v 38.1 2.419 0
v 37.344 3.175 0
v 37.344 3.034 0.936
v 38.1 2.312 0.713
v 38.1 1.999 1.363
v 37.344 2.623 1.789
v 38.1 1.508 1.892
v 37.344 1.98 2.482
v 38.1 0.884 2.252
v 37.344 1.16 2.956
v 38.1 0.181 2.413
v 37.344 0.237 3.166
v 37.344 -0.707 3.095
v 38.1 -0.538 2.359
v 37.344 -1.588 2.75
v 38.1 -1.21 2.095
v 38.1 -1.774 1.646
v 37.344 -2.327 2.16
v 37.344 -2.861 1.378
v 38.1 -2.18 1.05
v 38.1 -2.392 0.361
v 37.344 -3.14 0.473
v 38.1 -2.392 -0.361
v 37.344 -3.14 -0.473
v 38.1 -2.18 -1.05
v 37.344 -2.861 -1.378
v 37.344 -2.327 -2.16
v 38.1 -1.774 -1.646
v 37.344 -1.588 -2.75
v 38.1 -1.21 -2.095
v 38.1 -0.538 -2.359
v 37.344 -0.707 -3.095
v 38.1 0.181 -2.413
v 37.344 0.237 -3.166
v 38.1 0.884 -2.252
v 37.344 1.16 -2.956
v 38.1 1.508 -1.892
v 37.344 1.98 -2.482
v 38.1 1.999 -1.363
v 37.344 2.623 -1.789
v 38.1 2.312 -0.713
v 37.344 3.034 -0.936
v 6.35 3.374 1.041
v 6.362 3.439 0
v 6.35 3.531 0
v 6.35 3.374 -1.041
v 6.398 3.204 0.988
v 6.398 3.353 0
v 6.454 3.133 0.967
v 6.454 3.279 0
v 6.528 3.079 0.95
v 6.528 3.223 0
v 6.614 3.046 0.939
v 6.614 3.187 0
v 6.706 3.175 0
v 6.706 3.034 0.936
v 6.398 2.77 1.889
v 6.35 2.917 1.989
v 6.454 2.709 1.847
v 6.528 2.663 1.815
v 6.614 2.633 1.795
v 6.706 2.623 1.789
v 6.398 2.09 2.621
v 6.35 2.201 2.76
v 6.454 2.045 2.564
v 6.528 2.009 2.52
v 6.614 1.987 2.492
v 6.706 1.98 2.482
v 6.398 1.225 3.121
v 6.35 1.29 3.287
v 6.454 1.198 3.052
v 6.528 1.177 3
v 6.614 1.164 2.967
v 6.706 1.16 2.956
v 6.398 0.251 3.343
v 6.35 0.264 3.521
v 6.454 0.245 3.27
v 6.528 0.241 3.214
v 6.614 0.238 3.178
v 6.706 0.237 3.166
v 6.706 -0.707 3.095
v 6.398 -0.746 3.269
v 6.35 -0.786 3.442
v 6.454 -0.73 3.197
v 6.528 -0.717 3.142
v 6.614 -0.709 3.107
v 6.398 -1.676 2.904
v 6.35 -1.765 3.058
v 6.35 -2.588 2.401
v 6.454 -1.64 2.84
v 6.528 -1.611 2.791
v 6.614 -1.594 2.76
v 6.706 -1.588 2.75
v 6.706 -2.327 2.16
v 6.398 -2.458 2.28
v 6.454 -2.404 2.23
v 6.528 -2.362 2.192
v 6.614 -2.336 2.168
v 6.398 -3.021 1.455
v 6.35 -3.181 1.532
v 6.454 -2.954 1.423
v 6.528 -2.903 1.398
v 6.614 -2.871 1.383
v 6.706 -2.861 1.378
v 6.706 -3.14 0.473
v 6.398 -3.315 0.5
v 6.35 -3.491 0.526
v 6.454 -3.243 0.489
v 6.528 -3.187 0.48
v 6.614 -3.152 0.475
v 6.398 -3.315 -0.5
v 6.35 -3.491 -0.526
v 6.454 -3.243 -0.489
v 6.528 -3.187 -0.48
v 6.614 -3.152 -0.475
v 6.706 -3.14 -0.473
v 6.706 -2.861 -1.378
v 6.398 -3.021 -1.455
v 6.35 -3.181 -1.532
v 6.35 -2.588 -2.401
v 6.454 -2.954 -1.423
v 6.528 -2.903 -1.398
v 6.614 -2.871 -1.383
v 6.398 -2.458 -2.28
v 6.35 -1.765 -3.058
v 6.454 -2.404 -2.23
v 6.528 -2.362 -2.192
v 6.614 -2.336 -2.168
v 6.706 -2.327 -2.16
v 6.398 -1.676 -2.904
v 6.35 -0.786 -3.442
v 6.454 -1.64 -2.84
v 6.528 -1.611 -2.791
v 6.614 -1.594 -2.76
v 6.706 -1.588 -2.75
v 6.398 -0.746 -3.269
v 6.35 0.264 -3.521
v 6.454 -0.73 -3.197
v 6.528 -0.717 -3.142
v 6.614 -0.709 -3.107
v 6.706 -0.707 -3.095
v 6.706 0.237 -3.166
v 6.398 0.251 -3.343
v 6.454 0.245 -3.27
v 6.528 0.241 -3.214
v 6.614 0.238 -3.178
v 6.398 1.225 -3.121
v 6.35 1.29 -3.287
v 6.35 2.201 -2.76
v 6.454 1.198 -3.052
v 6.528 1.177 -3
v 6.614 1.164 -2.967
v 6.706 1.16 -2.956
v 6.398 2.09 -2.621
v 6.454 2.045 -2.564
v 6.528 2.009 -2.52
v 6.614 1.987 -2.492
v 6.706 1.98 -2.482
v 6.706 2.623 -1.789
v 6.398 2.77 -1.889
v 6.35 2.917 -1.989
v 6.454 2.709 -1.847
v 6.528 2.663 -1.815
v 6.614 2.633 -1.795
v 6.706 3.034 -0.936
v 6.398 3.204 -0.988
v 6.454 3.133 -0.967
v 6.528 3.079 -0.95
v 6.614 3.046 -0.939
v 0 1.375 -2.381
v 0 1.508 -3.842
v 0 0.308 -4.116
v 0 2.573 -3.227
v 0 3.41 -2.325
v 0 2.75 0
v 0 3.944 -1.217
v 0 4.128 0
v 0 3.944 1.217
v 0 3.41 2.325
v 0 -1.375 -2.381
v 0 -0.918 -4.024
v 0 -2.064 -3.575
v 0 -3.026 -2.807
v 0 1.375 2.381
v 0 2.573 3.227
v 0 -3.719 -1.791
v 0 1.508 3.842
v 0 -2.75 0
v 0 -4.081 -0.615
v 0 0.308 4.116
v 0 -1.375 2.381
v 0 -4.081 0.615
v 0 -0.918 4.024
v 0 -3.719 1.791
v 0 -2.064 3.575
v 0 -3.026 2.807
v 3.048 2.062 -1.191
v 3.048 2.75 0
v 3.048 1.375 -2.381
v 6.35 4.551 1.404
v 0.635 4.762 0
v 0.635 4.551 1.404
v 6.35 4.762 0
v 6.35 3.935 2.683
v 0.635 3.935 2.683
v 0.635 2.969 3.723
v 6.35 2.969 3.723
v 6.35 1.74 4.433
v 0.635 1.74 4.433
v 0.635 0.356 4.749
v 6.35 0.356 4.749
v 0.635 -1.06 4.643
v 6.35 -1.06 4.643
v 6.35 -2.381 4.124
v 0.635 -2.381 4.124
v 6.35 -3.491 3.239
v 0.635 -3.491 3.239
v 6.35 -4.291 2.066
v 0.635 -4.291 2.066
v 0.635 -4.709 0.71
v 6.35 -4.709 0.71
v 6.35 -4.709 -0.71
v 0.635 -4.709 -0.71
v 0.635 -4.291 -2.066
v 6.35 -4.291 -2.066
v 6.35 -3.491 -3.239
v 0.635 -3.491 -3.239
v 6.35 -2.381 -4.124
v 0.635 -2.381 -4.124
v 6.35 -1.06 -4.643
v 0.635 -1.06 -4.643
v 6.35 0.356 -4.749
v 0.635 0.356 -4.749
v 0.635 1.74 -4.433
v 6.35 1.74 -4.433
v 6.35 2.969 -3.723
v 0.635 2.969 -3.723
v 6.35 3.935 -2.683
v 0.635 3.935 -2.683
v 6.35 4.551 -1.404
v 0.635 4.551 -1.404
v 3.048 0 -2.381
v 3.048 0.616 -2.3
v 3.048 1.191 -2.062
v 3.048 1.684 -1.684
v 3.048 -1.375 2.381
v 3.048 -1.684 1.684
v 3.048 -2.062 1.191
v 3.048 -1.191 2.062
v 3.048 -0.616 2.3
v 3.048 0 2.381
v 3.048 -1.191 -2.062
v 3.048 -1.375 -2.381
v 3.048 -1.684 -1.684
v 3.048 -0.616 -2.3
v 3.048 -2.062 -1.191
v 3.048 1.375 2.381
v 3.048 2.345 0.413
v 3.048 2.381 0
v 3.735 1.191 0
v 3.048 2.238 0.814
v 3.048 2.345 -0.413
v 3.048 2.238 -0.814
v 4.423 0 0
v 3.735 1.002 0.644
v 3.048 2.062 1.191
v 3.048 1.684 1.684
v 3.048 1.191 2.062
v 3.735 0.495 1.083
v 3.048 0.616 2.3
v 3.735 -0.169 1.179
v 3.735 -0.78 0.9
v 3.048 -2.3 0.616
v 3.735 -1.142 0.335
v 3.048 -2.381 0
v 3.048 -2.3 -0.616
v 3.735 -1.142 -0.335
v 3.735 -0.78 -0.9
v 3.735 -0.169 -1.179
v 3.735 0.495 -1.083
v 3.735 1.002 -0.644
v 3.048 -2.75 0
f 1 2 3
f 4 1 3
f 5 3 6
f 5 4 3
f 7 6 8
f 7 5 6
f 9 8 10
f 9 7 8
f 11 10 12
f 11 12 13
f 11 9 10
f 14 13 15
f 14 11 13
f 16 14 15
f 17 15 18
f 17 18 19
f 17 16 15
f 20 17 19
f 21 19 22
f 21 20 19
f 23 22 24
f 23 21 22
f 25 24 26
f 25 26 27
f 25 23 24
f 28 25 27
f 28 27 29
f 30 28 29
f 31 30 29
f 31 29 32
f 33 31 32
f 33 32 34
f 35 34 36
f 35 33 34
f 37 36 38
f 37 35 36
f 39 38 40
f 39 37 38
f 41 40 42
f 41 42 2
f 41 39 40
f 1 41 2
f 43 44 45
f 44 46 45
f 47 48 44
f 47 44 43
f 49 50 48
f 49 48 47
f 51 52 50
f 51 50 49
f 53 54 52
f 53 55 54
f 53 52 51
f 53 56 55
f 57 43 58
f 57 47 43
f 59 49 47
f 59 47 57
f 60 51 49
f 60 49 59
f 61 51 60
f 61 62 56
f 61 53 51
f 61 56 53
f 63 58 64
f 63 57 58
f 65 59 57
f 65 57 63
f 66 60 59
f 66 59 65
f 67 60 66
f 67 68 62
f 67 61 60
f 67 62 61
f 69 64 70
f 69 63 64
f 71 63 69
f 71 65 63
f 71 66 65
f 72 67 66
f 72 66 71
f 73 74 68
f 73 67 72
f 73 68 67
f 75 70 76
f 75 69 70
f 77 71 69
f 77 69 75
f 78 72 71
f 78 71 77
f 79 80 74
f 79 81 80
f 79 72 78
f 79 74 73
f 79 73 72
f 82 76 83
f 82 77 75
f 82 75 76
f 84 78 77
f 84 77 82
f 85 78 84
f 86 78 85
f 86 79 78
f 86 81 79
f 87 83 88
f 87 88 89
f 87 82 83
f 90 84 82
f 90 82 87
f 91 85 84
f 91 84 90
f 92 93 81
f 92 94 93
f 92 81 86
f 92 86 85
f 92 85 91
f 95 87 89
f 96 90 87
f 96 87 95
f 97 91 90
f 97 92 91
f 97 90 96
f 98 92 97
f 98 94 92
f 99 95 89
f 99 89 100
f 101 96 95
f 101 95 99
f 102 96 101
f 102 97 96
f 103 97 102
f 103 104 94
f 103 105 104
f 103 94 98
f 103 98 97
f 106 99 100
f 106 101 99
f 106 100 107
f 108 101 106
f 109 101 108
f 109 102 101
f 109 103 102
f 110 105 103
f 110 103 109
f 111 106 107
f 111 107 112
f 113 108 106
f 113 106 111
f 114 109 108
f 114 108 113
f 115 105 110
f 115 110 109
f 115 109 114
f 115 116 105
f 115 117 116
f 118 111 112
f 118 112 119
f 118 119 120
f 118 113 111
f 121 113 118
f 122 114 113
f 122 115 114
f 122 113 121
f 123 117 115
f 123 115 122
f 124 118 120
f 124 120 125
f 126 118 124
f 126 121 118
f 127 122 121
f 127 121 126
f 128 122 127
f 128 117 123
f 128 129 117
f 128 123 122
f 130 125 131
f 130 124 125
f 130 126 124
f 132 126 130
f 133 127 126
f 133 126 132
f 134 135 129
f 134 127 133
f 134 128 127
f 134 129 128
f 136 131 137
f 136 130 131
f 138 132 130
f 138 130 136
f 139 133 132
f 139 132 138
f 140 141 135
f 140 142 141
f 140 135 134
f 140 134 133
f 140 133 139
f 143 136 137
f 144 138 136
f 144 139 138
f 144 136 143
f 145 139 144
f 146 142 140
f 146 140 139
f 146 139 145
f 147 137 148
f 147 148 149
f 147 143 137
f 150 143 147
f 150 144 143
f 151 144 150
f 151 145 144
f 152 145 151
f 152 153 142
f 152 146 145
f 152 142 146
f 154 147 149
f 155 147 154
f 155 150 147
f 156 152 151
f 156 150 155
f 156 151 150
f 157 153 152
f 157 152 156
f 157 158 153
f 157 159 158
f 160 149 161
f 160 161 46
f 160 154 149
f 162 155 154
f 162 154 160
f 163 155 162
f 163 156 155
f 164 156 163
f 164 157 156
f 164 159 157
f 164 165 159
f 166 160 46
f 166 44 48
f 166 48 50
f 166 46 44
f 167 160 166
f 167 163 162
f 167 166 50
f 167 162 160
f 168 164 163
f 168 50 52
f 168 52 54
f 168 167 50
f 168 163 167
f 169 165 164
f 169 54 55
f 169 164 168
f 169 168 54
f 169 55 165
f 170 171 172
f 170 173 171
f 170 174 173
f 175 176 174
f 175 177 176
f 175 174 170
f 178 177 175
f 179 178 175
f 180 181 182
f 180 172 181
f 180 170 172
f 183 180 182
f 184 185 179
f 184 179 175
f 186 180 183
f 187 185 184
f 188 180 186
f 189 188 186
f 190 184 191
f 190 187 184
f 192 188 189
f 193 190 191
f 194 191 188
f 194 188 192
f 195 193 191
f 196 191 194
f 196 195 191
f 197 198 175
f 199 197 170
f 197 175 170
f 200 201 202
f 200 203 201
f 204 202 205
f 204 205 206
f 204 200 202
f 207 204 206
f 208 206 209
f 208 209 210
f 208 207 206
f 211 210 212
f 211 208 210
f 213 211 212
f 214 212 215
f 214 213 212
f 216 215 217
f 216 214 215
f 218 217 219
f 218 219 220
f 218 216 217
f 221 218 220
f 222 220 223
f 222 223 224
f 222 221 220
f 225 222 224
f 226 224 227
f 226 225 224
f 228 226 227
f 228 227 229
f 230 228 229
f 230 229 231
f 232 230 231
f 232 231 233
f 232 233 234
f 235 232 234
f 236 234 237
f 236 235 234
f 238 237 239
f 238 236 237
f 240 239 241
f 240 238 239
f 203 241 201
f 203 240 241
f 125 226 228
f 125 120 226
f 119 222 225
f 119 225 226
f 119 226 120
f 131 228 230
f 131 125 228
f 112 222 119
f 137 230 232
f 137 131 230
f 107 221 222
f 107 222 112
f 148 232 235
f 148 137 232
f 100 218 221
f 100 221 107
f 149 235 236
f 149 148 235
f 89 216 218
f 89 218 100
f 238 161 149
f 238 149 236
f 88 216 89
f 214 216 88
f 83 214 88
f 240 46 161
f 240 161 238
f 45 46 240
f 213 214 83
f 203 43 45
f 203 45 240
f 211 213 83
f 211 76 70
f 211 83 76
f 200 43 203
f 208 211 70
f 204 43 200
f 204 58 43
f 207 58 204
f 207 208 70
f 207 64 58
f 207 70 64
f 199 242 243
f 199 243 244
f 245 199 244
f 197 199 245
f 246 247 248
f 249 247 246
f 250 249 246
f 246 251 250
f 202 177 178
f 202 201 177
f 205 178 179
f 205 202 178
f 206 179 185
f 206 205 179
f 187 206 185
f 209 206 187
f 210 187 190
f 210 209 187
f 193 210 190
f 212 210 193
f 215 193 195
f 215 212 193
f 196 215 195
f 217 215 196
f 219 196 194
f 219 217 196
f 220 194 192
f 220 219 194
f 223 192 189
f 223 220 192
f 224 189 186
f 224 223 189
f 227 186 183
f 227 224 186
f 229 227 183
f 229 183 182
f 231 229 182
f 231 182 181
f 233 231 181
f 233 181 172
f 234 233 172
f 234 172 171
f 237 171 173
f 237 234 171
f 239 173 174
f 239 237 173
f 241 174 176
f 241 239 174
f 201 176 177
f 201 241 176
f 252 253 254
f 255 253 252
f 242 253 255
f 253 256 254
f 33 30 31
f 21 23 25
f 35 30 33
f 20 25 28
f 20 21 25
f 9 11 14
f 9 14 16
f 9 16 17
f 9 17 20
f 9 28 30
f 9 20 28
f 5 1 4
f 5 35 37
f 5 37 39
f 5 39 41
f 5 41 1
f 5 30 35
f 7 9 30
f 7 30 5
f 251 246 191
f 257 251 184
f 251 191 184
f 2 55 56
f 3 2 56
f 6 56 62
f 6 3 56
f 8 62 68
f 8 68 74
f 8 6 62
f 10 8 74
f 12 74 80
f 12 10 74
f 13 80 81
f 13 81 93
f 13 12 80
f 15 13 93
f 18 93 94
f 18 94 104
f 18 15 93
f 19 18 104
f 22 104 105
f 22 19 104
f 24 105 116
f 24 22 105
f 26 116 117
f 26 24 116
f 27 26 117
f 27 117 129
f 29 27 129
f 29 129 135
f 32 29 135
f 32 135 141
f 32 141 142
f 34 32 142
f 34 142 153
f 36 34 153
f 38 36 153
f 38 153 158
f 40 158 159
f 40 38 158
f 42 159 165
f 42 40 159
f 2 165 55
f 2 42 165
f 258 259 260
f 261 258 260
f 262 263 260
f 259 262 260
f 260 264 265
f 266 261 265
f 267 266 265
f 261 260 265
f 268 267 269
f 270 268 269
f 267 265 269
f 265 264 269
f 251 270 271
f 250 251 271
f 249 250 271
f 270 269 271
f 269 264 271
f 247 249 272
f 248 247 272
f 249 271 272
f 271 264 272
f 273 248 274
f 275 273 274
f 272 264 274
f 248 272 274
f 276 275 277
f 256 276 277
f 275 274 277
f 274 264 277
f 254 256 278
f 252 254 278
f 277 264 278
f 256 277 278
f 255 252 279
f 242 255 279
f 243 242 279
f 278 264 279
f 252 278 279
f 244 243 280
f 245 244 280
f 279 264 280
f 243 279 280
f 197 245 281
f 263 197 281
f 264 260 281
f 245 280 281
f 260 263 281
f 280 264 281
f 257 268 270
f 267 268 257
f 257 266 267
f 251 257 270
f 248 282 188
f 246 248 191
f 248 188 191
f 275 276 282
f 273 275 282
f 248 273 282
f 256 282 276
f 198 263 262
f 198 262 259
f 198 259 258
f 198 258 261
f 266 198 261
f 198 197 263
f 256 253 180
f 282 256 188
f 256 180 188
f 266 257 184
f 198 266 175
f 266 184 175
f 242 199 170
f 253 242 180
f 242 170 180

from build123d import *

# Parameters (mm, degrees)
FILLET1_R   = 0.3556
HEX_2_DEPTH = 3.048


with BuildPart() as part:
    # BodySke → Base-Revolve (revolve)
    with BuildSketch(Plane.XY):
        Polygon((0, 0), (0, 4.1275), (0.635, 4.7625), (6.35, 4.7625), (6.35, 3.175), (37.34435, 3.175), (38.1, 2.41935), (38.1, 0), align=None)
    revolve(axis=Axis((-31.75, 0, 0), (1, 0, 0)))

    # Fillet1
    fillet1_edges = [part.edges().sort_by_distance(p)[0] for p in [
        (6.35, -3.175, 0),
    ]]
    fillet(fillet1_edges, radius=FILLET1_R)

    # Sketch2 → Hex-PreBroach (revolve, cut)
    with BuildSketch(Plane.XY):
        Polygon((0, 2.38125), (3.048, 2.38125), (4.422815329, 0), (0, 0), align=None)
    revolve(axis=Axis((0, 0, 0), (1, 0, 0)), mode=Mode.SUBTRACT)

    # Sketch3 → Hex 2 (cut)
    with BuildSketch(Plane(origin=(0, 0, 0), x_dir=(0, 0.5, 0.866025404), z_dir=(-1, 0, 0))):
        Polygon((1.374815329, 2.38125), (-1.374815329, 2.38125), (-2.749630657, 0), (-1.374815329, -2.38125), (1.374815329, -2.38125), (2.749630657, 0), align=None)
    extrude(amount=-HEX_2_DEPTH, mode=Mode.SUBTRACT)


solid = part.part
